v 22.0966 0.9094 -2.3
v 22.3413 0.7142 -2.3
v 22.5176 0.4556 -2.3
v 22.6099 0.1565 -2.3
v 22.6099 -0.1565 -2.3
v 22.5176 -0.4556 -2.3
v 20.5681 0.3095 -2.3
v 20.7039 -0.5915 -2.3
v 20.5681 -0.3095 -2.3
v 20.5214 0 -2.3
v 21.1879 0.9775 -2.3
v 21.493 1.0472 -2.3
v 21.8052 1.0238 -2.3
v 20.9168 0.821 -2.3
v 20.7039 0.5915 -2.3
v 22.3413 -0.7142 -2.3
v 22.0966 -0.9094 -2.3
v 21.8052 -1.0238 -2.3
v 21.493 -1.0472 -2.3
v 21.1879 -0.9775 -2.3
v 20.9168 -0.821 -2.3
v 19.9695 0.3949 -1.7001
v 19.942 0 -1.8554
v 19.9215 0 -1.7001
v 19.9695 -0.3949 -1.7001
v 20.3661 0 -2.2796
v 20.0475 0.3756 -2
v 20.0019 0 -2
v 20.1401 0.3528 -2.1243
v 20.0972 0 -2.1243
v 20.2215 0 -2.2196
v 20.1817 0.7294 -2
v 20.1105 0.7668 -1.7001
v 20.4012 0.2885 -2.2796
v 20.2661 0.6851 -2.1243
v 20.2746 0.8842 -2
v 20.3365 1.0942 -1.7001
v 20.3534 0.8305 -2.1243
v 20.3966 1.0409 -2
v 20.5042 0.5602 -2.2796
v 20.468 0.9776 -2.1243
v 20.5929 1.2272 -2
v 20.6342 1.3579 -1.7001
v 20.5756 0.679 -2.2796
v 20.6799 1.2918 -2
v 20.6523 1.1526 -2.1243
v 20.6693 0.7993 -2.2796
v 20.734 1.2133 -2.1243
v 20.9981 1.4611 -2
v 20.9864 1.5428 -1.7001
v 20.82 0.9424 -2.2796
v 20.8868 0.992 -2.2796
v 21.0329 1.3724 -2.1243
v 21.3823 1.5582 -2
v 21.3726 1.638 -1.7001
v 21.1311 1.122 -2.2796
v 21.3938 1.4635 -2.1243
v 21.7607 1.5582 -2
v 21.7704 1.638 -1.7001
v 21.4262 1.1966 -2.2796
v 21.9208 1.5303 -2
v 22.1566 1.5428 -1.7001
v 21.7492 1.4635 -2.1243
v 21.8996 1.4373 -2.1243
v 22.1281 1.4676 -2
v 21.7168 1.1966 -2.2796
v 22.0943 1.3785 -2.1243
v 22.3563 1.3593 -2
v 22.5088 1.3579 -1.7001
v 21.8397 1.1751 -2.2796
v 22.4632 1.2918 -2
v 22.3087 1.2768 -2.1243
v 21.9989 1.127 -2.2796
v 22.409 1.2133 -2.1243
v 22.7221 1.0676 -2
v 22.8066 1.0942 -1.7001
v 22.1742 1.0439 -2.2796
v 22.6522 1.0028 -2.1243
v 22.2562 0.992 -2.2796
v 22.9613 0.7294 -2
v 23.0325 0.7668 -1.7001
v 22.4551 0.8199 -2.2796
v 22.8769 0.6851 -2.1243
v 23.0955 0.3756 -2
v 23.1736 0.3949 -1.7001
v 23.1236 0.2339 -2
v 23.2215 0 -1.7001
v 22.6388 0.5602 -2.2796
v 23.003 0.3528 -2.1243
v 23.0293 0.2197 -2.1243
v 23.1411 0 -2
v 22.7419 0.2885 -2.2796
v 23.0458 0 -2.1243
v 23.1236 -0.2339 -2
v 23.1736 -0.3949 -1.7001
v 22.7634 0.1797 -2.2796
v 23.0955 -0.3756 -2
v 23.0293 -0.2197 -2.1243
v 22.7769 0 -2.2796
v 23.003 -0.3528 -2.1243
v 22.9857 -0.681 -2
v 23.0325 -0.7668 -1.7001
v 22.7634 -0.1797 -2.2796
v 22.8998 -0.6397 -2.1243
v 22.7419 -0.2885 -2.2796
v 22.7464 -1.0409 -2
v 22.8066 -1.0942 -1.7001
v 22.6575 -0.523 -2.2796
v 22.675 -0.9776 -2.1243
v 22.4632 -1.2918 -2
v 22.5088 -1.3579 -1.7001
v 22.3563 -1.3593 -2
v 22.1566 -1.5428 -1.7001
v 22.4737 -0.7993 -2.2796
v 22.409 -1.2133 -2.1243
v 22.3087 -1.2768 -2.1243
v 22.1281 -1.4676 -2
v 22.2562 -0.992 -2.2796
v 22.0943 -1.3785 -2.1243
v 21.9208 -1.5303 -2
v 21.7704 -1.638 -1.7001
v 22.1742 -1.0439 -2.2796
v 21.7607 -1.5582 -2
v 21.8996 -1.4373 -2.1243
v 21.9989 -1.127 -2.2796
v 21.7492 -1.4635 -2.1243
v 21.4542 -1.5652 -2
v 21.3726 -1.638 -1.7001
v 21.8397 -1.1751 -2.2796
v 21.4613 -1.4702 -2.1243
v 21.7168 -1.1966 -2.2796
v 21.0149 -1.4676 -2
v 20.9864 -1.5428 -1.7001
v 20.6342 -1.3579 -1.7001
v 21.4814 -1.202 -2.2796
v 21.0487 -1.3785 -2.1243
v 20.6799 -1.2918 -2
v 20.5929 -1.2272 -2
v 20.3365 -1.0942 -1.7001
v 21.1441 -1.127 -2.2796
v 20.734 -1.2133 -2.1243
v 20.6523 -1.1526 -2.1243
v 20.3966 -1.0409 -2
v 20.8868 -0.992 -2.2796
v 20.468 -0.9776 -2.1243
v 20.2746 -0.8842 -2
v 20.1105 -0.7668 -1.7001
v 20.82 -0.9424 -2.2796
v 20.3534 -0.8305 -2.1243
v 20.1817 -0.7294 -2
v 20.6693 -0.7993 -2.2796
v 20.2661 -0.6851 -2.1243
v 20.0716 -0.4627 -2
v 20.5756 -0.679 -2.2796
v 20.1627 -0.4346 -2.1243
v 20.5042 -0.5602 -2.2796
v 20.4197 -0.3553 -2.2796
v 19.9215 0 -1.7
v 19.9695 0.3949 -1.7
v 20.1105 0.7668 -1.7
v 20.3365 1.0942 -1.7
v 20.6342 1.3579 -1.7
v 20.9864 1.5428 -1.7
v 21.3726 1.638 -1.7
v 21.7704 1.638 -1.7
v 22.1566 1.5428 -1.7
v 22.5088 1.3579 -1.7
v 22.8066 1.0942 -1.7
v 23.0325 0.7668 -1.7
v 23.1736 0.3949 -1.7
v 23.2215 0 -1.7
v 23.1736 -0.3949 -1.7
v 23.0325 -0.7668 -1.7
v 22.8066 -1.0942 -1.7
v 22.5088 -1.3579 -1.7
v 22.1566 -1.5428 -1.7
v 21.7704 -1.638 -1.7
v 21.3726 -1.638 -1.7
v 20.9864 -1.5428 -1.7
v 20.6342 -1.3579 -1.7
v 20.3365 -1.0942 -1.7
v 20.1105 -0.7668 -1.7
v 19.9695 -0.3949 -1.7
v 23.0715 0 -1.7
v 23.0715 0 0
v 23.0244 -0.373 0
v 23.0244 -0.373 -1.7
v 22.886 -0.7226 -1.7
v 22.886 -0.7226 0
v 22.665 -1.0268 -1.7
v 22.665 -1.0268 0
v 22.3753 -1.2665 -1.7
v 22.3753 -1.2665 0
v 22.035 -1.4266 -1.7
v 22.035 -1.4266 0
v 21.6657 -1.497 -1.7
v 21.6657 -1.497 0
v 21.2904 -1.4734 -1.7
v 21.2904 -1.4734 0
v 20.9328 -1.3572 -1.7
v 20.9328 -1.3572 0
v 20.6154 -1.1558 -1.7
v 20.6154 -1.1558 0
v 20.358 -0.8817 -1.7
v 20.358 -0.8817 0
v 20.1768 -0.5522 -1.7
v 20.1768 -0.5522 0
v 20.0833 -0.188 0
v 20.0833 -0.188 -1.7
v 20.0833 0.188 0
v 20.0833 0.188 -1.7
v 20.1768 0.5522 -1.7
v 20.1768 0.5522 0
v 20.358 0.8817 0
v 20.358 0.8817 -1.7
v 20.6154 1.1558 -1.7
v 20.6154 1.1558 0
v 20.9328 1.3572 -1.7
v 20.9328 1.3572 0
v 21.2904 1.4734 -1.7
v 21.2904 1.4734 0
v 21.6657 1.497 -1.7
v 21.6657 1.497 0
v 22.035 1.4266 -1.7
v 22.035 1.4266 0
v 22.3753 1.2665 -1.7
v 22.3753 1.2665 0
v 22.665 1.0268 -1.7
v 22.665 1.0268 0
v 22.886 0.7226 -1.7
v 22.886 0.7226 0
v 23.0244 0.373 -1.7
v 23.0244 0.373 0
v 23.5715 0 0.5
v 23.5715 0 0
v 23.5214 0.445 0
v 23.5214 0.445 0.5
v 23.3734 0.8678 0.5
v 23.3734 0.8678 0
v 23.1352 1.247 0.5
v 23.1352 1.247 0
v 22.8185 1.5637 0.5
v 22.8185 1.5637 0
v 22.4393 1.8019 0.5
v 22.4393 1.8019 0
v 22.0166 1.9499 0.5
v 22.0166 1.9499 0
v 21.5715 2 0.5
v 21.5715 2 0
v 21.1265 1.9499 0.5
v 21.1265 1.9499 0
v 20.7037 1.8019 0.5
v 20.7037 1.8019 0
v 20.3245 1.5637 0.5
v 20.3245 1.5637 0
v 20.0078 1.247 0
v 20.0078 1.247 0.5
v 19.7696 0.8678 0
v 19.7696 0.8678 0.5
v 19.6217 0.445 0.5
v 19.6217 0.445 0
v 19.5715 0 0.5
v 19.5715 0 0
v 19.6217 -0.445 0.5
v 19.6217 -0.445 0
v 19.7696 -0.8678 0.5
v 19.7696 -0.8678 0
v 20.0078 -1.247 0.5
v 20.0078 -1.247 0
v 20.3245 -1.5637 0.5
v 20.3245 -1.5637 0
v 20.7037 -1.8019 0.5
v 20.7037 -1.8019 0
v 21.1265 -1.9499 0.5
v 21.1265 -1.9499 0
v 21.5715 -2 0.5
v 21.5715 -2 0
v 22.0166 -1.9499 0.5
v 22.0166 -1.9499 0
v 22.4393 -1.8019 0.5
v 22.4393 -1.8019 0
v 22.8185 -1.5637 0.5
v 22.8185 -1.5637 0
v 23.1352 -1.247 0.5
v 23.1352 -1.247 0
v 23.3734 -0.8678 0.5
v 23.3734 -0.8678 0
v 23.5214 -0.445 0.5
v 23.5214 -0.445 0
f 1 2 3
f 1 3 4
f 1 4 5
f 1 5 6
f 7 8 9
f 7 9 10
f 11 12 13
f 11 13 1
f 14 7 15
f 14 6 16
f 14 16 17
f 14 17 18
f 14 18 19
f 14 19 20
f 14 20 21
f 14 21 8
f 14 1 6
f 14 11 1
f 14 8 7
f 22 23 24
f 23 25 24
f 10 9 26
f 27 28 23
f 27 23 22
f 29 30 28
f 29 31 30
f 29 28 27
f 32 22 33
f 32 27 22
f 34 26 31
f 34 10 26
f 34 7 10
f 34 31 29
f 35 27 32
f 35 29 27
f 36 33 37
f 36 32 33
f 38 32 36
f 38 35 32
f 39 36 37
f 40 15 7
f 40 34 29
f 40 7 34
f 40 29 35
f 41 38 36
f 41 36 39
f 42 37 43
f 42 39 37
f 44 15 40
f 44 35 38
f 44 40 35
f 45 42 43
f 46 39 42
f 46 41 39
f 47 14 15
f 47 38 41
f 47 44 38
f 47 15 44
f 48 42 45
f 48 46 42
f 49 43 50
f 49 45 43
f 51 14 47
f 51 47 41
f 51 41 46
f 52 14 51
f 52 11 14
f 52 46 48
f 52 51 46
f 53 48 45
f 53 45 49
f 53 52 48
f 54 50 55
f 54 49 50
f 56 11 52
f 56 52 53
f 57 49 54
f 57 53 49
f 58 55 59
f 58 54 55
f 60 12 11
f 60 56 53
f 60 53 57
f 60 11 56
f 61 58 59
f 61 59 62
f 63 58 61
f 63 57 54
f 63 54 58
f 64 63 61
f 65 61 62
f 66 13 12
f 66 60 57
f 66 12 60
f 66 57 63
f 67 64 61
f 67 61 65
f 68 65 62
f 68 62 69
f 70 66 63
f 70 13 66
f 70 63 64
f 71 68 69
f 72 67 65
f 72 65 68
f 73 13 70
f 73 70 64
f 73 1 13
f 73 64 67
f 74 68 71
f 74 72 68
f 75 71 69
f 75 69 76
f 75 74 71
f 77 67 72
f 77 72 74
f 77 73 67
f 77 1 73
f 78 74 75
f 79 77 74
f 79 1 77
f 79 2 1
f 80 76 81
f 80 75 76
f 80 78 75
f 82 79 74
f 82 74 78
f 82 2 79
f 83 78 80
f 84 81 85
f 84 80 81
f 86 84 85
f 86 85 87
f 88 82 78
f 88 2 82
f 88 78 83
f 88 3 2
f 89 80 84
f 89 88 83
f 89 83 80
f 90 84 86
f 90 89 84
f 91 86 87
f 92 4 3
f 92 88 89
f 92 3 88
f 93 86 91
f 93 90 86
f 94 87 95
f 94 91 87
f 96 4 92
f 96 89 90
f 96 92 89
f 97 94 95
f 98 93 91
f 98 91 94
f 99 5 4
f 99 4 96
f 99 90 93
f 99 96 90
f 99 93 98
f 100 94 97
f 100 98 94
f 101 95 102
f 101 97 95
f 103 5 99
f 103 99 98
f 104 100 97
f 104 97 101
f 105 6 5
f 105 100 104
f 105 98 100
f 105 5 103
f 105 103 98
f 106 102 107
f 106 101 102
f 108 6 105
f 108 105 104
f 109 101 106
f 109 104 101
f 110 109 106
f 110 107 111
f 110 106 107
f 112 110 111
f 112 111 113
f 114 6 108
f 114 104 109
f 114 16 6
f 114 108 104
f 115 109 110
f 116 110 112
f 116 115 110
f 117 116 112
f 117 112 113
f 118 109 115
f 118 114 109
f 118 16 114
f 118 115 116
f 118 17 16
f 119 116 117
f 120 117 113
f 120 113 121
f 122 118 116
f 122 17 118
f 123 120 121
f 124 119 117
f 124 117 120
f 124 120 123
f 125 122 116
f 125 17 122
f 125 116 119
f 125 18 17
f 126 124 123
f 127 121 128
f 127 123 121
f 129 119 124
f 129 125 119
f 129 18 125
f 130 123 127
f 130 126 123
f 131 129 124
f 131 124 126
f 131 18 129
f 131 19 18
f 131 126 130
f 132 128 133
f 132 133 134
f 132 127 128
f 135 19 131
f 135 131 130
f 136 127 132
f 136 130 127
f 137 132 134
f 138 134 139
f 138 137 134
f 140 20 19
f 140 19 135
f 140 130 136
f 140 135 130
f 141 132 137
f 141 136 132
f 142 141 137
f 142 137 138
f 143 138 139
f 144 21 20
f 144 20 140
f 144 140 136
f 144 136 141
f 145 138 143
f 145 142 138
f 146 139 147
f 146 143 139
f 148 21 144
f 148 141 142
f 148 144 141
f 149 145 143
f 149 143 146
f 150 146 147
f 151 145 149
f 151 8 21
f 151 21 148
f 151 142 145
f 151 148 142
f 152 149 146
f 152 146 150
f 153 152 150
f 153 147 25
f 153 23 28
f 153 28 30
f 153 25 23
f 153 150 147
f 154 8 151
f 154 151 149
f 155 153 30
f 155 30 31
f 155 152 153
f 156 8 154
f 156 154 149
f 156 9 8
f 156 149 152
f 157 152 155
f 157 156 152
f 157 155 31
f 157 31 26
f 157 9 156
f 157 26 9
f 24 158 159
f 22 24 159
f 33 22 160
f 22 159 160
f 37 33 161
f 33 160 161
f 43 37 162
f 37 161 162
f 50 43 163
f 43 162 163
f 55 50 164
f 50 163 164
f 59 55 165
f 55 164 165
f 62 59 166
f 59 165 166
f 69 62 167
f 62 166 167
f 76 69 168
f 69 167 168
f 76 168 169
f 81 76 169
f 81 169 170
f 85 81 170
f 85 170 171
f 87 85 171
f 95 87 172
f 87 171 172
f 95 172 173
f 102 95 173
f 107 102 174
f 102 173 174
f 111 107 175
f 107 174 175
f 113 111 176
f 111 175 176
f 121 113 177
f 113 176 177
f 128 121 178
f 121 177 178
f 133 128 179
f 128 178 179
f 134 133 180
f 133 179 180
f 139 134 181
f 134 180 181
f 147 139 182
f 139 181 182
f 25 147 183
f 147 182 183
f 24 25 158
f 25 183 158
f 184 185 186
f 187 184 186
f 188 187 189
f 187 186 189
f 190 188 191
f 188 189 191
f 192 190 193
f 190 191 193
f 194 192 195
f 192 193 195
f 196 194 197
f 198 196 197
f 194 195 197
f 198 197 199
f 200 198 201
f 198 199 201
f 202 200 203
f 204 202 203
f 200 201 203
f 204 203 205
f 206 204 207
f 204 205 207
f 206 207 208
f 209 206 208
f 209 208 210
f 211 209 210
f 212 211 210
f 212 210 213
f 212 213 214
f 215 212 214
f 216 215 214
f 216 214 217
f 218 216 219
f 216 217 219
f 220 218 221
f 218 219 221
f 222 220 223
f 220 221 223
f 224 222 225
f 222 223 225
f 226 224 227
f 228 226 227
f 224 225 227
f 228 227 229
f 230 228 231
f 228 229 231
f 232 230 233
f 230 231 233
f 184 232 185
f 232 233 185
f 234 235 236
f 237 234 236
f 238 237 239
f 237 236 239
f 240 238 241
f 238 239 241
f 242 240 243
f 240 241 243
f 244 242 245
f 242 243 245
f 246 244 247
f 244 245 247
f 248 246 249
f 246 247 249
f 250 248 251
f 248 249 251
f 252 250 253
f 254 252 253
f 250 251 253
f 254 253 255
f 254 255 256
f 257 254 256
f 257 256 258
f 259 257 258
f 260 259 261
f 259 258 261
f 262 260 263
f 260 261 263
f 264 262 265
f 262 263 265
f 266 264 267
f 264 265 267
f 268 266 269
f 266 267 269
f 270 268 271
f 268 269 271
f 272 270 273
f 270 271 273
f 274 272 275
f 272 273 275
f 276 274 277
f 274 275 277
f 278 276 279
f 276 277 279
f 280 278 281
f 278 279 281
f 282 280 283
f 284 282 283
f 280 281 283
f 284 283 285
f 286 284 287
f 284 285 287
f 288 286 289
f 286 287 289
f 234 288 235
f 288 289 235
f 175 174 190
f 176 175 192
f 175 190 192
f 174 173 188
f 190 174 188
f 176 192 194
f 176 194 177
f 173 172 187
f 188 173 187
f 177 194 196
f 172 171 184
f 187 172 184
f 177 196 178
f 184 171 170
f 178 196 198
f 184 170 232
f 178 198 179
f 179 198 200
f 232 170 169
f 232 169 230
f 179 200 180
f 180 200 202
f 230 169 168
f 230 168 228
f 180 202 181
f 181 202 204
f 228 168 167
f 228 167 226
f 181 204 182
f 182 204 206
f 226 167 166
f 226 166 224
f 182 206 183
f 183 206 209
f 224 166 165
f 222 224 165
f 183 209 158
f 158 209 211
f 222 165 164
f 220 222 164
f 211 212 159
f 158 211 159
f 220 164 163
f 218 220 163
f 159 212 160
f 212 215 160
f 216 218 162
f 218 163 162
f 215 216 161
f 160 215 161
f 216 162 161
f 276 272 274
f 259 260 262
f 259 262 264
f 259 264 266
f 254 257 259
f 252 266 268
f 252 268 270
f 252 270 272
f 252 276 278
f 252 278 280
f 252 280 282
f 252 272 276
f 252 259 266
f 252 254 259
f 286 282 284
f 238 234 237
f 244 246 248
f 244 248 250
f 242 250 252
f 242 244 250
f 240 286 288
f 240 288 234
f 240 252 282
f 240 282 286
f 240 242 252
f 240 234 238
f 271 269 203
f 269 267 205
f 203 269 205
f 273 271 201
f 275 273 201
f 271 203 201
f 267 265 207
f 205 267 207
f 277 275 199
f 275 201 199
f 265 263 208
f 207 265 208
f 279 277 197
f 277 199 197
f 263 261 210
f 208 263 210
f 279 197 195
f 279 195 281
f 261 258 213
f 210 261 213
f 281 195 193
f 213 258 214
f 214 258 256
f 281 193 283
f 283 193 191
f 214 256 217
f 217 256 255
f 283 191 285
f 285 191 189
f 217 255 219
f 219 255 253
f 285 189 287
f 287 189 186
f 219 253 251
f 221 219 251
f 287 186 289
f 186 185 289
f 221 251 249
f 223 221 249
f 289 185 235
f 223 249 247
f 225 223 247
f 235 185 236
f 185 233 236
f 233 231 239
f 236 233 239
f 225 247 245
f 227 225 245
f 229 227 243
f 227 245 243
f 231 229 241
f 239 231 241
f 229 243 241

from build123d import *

# Parameters (mm, degrees)
IZIM1_R                     = 2
Y_KSEKLIK_EKSTR_ZYON1_DEPTH = 0.5
IZIM2_R                     = 1.5
Y_KSEKLIK_EKSTR_ZYON2_DEPTH = 1.7
IZIM3_R                     = 1.65
Y_KSEKLIK_EKSTR_ZYON3_DEPTH = 0.6
RADYUS1_R                   = 0.6


with BuildPart() as part:
    # Çizim1 → Yükseklik-Ekstrüzyon1 (new body)
    with BuildSketch(Plane.XY):
        with Locations((21.571512145, 0)):
            Circle(IZIM1_R)
    extrude(amount=Y_KSEKLIK_EKSTR_ZYON1_DEPTH)

    # Çizim2 → Yükseklik-Ekstrüzyon2 (add)
    with BuildSketch(Plane(origin=(0, 0, 0), x_dir=(-1, 0, 0), z_dir=(0, 0, -1))):
        with Locations(Location((-21.571512145, 0, 0), (0, 0, 180))):
            Circle(IZIM2_R)
    extrude(amount=Y_KSEKLIK_EKSTR_ZYON2_DEPTH)

    # Çizim3 → Yükseklik-Ekstrüzyon3 (add)
    with BuildSketch(Plane(origin=(0, 0, -1.7), x_dir=(-1, 0, 0), z_dir=(0, 0, -1))):
        with Locations((-21.571512145, 0)):
            Circle(IZIM3_R)
    extrude(amount=Y_KSEKLIK_EKSTR_ZYON3_DEPTH)

    # Radyus1
    radyus1_edges = [part.edges().sort_by_distance(p)[0] for p in [
        (23.221512145, 0, -2.3),
    ]]
    fillet(radyus1_edges, radius=RADYUS1_R - 0.0001)  # a hair under: the kernel refuses the full size


solid = part.part
